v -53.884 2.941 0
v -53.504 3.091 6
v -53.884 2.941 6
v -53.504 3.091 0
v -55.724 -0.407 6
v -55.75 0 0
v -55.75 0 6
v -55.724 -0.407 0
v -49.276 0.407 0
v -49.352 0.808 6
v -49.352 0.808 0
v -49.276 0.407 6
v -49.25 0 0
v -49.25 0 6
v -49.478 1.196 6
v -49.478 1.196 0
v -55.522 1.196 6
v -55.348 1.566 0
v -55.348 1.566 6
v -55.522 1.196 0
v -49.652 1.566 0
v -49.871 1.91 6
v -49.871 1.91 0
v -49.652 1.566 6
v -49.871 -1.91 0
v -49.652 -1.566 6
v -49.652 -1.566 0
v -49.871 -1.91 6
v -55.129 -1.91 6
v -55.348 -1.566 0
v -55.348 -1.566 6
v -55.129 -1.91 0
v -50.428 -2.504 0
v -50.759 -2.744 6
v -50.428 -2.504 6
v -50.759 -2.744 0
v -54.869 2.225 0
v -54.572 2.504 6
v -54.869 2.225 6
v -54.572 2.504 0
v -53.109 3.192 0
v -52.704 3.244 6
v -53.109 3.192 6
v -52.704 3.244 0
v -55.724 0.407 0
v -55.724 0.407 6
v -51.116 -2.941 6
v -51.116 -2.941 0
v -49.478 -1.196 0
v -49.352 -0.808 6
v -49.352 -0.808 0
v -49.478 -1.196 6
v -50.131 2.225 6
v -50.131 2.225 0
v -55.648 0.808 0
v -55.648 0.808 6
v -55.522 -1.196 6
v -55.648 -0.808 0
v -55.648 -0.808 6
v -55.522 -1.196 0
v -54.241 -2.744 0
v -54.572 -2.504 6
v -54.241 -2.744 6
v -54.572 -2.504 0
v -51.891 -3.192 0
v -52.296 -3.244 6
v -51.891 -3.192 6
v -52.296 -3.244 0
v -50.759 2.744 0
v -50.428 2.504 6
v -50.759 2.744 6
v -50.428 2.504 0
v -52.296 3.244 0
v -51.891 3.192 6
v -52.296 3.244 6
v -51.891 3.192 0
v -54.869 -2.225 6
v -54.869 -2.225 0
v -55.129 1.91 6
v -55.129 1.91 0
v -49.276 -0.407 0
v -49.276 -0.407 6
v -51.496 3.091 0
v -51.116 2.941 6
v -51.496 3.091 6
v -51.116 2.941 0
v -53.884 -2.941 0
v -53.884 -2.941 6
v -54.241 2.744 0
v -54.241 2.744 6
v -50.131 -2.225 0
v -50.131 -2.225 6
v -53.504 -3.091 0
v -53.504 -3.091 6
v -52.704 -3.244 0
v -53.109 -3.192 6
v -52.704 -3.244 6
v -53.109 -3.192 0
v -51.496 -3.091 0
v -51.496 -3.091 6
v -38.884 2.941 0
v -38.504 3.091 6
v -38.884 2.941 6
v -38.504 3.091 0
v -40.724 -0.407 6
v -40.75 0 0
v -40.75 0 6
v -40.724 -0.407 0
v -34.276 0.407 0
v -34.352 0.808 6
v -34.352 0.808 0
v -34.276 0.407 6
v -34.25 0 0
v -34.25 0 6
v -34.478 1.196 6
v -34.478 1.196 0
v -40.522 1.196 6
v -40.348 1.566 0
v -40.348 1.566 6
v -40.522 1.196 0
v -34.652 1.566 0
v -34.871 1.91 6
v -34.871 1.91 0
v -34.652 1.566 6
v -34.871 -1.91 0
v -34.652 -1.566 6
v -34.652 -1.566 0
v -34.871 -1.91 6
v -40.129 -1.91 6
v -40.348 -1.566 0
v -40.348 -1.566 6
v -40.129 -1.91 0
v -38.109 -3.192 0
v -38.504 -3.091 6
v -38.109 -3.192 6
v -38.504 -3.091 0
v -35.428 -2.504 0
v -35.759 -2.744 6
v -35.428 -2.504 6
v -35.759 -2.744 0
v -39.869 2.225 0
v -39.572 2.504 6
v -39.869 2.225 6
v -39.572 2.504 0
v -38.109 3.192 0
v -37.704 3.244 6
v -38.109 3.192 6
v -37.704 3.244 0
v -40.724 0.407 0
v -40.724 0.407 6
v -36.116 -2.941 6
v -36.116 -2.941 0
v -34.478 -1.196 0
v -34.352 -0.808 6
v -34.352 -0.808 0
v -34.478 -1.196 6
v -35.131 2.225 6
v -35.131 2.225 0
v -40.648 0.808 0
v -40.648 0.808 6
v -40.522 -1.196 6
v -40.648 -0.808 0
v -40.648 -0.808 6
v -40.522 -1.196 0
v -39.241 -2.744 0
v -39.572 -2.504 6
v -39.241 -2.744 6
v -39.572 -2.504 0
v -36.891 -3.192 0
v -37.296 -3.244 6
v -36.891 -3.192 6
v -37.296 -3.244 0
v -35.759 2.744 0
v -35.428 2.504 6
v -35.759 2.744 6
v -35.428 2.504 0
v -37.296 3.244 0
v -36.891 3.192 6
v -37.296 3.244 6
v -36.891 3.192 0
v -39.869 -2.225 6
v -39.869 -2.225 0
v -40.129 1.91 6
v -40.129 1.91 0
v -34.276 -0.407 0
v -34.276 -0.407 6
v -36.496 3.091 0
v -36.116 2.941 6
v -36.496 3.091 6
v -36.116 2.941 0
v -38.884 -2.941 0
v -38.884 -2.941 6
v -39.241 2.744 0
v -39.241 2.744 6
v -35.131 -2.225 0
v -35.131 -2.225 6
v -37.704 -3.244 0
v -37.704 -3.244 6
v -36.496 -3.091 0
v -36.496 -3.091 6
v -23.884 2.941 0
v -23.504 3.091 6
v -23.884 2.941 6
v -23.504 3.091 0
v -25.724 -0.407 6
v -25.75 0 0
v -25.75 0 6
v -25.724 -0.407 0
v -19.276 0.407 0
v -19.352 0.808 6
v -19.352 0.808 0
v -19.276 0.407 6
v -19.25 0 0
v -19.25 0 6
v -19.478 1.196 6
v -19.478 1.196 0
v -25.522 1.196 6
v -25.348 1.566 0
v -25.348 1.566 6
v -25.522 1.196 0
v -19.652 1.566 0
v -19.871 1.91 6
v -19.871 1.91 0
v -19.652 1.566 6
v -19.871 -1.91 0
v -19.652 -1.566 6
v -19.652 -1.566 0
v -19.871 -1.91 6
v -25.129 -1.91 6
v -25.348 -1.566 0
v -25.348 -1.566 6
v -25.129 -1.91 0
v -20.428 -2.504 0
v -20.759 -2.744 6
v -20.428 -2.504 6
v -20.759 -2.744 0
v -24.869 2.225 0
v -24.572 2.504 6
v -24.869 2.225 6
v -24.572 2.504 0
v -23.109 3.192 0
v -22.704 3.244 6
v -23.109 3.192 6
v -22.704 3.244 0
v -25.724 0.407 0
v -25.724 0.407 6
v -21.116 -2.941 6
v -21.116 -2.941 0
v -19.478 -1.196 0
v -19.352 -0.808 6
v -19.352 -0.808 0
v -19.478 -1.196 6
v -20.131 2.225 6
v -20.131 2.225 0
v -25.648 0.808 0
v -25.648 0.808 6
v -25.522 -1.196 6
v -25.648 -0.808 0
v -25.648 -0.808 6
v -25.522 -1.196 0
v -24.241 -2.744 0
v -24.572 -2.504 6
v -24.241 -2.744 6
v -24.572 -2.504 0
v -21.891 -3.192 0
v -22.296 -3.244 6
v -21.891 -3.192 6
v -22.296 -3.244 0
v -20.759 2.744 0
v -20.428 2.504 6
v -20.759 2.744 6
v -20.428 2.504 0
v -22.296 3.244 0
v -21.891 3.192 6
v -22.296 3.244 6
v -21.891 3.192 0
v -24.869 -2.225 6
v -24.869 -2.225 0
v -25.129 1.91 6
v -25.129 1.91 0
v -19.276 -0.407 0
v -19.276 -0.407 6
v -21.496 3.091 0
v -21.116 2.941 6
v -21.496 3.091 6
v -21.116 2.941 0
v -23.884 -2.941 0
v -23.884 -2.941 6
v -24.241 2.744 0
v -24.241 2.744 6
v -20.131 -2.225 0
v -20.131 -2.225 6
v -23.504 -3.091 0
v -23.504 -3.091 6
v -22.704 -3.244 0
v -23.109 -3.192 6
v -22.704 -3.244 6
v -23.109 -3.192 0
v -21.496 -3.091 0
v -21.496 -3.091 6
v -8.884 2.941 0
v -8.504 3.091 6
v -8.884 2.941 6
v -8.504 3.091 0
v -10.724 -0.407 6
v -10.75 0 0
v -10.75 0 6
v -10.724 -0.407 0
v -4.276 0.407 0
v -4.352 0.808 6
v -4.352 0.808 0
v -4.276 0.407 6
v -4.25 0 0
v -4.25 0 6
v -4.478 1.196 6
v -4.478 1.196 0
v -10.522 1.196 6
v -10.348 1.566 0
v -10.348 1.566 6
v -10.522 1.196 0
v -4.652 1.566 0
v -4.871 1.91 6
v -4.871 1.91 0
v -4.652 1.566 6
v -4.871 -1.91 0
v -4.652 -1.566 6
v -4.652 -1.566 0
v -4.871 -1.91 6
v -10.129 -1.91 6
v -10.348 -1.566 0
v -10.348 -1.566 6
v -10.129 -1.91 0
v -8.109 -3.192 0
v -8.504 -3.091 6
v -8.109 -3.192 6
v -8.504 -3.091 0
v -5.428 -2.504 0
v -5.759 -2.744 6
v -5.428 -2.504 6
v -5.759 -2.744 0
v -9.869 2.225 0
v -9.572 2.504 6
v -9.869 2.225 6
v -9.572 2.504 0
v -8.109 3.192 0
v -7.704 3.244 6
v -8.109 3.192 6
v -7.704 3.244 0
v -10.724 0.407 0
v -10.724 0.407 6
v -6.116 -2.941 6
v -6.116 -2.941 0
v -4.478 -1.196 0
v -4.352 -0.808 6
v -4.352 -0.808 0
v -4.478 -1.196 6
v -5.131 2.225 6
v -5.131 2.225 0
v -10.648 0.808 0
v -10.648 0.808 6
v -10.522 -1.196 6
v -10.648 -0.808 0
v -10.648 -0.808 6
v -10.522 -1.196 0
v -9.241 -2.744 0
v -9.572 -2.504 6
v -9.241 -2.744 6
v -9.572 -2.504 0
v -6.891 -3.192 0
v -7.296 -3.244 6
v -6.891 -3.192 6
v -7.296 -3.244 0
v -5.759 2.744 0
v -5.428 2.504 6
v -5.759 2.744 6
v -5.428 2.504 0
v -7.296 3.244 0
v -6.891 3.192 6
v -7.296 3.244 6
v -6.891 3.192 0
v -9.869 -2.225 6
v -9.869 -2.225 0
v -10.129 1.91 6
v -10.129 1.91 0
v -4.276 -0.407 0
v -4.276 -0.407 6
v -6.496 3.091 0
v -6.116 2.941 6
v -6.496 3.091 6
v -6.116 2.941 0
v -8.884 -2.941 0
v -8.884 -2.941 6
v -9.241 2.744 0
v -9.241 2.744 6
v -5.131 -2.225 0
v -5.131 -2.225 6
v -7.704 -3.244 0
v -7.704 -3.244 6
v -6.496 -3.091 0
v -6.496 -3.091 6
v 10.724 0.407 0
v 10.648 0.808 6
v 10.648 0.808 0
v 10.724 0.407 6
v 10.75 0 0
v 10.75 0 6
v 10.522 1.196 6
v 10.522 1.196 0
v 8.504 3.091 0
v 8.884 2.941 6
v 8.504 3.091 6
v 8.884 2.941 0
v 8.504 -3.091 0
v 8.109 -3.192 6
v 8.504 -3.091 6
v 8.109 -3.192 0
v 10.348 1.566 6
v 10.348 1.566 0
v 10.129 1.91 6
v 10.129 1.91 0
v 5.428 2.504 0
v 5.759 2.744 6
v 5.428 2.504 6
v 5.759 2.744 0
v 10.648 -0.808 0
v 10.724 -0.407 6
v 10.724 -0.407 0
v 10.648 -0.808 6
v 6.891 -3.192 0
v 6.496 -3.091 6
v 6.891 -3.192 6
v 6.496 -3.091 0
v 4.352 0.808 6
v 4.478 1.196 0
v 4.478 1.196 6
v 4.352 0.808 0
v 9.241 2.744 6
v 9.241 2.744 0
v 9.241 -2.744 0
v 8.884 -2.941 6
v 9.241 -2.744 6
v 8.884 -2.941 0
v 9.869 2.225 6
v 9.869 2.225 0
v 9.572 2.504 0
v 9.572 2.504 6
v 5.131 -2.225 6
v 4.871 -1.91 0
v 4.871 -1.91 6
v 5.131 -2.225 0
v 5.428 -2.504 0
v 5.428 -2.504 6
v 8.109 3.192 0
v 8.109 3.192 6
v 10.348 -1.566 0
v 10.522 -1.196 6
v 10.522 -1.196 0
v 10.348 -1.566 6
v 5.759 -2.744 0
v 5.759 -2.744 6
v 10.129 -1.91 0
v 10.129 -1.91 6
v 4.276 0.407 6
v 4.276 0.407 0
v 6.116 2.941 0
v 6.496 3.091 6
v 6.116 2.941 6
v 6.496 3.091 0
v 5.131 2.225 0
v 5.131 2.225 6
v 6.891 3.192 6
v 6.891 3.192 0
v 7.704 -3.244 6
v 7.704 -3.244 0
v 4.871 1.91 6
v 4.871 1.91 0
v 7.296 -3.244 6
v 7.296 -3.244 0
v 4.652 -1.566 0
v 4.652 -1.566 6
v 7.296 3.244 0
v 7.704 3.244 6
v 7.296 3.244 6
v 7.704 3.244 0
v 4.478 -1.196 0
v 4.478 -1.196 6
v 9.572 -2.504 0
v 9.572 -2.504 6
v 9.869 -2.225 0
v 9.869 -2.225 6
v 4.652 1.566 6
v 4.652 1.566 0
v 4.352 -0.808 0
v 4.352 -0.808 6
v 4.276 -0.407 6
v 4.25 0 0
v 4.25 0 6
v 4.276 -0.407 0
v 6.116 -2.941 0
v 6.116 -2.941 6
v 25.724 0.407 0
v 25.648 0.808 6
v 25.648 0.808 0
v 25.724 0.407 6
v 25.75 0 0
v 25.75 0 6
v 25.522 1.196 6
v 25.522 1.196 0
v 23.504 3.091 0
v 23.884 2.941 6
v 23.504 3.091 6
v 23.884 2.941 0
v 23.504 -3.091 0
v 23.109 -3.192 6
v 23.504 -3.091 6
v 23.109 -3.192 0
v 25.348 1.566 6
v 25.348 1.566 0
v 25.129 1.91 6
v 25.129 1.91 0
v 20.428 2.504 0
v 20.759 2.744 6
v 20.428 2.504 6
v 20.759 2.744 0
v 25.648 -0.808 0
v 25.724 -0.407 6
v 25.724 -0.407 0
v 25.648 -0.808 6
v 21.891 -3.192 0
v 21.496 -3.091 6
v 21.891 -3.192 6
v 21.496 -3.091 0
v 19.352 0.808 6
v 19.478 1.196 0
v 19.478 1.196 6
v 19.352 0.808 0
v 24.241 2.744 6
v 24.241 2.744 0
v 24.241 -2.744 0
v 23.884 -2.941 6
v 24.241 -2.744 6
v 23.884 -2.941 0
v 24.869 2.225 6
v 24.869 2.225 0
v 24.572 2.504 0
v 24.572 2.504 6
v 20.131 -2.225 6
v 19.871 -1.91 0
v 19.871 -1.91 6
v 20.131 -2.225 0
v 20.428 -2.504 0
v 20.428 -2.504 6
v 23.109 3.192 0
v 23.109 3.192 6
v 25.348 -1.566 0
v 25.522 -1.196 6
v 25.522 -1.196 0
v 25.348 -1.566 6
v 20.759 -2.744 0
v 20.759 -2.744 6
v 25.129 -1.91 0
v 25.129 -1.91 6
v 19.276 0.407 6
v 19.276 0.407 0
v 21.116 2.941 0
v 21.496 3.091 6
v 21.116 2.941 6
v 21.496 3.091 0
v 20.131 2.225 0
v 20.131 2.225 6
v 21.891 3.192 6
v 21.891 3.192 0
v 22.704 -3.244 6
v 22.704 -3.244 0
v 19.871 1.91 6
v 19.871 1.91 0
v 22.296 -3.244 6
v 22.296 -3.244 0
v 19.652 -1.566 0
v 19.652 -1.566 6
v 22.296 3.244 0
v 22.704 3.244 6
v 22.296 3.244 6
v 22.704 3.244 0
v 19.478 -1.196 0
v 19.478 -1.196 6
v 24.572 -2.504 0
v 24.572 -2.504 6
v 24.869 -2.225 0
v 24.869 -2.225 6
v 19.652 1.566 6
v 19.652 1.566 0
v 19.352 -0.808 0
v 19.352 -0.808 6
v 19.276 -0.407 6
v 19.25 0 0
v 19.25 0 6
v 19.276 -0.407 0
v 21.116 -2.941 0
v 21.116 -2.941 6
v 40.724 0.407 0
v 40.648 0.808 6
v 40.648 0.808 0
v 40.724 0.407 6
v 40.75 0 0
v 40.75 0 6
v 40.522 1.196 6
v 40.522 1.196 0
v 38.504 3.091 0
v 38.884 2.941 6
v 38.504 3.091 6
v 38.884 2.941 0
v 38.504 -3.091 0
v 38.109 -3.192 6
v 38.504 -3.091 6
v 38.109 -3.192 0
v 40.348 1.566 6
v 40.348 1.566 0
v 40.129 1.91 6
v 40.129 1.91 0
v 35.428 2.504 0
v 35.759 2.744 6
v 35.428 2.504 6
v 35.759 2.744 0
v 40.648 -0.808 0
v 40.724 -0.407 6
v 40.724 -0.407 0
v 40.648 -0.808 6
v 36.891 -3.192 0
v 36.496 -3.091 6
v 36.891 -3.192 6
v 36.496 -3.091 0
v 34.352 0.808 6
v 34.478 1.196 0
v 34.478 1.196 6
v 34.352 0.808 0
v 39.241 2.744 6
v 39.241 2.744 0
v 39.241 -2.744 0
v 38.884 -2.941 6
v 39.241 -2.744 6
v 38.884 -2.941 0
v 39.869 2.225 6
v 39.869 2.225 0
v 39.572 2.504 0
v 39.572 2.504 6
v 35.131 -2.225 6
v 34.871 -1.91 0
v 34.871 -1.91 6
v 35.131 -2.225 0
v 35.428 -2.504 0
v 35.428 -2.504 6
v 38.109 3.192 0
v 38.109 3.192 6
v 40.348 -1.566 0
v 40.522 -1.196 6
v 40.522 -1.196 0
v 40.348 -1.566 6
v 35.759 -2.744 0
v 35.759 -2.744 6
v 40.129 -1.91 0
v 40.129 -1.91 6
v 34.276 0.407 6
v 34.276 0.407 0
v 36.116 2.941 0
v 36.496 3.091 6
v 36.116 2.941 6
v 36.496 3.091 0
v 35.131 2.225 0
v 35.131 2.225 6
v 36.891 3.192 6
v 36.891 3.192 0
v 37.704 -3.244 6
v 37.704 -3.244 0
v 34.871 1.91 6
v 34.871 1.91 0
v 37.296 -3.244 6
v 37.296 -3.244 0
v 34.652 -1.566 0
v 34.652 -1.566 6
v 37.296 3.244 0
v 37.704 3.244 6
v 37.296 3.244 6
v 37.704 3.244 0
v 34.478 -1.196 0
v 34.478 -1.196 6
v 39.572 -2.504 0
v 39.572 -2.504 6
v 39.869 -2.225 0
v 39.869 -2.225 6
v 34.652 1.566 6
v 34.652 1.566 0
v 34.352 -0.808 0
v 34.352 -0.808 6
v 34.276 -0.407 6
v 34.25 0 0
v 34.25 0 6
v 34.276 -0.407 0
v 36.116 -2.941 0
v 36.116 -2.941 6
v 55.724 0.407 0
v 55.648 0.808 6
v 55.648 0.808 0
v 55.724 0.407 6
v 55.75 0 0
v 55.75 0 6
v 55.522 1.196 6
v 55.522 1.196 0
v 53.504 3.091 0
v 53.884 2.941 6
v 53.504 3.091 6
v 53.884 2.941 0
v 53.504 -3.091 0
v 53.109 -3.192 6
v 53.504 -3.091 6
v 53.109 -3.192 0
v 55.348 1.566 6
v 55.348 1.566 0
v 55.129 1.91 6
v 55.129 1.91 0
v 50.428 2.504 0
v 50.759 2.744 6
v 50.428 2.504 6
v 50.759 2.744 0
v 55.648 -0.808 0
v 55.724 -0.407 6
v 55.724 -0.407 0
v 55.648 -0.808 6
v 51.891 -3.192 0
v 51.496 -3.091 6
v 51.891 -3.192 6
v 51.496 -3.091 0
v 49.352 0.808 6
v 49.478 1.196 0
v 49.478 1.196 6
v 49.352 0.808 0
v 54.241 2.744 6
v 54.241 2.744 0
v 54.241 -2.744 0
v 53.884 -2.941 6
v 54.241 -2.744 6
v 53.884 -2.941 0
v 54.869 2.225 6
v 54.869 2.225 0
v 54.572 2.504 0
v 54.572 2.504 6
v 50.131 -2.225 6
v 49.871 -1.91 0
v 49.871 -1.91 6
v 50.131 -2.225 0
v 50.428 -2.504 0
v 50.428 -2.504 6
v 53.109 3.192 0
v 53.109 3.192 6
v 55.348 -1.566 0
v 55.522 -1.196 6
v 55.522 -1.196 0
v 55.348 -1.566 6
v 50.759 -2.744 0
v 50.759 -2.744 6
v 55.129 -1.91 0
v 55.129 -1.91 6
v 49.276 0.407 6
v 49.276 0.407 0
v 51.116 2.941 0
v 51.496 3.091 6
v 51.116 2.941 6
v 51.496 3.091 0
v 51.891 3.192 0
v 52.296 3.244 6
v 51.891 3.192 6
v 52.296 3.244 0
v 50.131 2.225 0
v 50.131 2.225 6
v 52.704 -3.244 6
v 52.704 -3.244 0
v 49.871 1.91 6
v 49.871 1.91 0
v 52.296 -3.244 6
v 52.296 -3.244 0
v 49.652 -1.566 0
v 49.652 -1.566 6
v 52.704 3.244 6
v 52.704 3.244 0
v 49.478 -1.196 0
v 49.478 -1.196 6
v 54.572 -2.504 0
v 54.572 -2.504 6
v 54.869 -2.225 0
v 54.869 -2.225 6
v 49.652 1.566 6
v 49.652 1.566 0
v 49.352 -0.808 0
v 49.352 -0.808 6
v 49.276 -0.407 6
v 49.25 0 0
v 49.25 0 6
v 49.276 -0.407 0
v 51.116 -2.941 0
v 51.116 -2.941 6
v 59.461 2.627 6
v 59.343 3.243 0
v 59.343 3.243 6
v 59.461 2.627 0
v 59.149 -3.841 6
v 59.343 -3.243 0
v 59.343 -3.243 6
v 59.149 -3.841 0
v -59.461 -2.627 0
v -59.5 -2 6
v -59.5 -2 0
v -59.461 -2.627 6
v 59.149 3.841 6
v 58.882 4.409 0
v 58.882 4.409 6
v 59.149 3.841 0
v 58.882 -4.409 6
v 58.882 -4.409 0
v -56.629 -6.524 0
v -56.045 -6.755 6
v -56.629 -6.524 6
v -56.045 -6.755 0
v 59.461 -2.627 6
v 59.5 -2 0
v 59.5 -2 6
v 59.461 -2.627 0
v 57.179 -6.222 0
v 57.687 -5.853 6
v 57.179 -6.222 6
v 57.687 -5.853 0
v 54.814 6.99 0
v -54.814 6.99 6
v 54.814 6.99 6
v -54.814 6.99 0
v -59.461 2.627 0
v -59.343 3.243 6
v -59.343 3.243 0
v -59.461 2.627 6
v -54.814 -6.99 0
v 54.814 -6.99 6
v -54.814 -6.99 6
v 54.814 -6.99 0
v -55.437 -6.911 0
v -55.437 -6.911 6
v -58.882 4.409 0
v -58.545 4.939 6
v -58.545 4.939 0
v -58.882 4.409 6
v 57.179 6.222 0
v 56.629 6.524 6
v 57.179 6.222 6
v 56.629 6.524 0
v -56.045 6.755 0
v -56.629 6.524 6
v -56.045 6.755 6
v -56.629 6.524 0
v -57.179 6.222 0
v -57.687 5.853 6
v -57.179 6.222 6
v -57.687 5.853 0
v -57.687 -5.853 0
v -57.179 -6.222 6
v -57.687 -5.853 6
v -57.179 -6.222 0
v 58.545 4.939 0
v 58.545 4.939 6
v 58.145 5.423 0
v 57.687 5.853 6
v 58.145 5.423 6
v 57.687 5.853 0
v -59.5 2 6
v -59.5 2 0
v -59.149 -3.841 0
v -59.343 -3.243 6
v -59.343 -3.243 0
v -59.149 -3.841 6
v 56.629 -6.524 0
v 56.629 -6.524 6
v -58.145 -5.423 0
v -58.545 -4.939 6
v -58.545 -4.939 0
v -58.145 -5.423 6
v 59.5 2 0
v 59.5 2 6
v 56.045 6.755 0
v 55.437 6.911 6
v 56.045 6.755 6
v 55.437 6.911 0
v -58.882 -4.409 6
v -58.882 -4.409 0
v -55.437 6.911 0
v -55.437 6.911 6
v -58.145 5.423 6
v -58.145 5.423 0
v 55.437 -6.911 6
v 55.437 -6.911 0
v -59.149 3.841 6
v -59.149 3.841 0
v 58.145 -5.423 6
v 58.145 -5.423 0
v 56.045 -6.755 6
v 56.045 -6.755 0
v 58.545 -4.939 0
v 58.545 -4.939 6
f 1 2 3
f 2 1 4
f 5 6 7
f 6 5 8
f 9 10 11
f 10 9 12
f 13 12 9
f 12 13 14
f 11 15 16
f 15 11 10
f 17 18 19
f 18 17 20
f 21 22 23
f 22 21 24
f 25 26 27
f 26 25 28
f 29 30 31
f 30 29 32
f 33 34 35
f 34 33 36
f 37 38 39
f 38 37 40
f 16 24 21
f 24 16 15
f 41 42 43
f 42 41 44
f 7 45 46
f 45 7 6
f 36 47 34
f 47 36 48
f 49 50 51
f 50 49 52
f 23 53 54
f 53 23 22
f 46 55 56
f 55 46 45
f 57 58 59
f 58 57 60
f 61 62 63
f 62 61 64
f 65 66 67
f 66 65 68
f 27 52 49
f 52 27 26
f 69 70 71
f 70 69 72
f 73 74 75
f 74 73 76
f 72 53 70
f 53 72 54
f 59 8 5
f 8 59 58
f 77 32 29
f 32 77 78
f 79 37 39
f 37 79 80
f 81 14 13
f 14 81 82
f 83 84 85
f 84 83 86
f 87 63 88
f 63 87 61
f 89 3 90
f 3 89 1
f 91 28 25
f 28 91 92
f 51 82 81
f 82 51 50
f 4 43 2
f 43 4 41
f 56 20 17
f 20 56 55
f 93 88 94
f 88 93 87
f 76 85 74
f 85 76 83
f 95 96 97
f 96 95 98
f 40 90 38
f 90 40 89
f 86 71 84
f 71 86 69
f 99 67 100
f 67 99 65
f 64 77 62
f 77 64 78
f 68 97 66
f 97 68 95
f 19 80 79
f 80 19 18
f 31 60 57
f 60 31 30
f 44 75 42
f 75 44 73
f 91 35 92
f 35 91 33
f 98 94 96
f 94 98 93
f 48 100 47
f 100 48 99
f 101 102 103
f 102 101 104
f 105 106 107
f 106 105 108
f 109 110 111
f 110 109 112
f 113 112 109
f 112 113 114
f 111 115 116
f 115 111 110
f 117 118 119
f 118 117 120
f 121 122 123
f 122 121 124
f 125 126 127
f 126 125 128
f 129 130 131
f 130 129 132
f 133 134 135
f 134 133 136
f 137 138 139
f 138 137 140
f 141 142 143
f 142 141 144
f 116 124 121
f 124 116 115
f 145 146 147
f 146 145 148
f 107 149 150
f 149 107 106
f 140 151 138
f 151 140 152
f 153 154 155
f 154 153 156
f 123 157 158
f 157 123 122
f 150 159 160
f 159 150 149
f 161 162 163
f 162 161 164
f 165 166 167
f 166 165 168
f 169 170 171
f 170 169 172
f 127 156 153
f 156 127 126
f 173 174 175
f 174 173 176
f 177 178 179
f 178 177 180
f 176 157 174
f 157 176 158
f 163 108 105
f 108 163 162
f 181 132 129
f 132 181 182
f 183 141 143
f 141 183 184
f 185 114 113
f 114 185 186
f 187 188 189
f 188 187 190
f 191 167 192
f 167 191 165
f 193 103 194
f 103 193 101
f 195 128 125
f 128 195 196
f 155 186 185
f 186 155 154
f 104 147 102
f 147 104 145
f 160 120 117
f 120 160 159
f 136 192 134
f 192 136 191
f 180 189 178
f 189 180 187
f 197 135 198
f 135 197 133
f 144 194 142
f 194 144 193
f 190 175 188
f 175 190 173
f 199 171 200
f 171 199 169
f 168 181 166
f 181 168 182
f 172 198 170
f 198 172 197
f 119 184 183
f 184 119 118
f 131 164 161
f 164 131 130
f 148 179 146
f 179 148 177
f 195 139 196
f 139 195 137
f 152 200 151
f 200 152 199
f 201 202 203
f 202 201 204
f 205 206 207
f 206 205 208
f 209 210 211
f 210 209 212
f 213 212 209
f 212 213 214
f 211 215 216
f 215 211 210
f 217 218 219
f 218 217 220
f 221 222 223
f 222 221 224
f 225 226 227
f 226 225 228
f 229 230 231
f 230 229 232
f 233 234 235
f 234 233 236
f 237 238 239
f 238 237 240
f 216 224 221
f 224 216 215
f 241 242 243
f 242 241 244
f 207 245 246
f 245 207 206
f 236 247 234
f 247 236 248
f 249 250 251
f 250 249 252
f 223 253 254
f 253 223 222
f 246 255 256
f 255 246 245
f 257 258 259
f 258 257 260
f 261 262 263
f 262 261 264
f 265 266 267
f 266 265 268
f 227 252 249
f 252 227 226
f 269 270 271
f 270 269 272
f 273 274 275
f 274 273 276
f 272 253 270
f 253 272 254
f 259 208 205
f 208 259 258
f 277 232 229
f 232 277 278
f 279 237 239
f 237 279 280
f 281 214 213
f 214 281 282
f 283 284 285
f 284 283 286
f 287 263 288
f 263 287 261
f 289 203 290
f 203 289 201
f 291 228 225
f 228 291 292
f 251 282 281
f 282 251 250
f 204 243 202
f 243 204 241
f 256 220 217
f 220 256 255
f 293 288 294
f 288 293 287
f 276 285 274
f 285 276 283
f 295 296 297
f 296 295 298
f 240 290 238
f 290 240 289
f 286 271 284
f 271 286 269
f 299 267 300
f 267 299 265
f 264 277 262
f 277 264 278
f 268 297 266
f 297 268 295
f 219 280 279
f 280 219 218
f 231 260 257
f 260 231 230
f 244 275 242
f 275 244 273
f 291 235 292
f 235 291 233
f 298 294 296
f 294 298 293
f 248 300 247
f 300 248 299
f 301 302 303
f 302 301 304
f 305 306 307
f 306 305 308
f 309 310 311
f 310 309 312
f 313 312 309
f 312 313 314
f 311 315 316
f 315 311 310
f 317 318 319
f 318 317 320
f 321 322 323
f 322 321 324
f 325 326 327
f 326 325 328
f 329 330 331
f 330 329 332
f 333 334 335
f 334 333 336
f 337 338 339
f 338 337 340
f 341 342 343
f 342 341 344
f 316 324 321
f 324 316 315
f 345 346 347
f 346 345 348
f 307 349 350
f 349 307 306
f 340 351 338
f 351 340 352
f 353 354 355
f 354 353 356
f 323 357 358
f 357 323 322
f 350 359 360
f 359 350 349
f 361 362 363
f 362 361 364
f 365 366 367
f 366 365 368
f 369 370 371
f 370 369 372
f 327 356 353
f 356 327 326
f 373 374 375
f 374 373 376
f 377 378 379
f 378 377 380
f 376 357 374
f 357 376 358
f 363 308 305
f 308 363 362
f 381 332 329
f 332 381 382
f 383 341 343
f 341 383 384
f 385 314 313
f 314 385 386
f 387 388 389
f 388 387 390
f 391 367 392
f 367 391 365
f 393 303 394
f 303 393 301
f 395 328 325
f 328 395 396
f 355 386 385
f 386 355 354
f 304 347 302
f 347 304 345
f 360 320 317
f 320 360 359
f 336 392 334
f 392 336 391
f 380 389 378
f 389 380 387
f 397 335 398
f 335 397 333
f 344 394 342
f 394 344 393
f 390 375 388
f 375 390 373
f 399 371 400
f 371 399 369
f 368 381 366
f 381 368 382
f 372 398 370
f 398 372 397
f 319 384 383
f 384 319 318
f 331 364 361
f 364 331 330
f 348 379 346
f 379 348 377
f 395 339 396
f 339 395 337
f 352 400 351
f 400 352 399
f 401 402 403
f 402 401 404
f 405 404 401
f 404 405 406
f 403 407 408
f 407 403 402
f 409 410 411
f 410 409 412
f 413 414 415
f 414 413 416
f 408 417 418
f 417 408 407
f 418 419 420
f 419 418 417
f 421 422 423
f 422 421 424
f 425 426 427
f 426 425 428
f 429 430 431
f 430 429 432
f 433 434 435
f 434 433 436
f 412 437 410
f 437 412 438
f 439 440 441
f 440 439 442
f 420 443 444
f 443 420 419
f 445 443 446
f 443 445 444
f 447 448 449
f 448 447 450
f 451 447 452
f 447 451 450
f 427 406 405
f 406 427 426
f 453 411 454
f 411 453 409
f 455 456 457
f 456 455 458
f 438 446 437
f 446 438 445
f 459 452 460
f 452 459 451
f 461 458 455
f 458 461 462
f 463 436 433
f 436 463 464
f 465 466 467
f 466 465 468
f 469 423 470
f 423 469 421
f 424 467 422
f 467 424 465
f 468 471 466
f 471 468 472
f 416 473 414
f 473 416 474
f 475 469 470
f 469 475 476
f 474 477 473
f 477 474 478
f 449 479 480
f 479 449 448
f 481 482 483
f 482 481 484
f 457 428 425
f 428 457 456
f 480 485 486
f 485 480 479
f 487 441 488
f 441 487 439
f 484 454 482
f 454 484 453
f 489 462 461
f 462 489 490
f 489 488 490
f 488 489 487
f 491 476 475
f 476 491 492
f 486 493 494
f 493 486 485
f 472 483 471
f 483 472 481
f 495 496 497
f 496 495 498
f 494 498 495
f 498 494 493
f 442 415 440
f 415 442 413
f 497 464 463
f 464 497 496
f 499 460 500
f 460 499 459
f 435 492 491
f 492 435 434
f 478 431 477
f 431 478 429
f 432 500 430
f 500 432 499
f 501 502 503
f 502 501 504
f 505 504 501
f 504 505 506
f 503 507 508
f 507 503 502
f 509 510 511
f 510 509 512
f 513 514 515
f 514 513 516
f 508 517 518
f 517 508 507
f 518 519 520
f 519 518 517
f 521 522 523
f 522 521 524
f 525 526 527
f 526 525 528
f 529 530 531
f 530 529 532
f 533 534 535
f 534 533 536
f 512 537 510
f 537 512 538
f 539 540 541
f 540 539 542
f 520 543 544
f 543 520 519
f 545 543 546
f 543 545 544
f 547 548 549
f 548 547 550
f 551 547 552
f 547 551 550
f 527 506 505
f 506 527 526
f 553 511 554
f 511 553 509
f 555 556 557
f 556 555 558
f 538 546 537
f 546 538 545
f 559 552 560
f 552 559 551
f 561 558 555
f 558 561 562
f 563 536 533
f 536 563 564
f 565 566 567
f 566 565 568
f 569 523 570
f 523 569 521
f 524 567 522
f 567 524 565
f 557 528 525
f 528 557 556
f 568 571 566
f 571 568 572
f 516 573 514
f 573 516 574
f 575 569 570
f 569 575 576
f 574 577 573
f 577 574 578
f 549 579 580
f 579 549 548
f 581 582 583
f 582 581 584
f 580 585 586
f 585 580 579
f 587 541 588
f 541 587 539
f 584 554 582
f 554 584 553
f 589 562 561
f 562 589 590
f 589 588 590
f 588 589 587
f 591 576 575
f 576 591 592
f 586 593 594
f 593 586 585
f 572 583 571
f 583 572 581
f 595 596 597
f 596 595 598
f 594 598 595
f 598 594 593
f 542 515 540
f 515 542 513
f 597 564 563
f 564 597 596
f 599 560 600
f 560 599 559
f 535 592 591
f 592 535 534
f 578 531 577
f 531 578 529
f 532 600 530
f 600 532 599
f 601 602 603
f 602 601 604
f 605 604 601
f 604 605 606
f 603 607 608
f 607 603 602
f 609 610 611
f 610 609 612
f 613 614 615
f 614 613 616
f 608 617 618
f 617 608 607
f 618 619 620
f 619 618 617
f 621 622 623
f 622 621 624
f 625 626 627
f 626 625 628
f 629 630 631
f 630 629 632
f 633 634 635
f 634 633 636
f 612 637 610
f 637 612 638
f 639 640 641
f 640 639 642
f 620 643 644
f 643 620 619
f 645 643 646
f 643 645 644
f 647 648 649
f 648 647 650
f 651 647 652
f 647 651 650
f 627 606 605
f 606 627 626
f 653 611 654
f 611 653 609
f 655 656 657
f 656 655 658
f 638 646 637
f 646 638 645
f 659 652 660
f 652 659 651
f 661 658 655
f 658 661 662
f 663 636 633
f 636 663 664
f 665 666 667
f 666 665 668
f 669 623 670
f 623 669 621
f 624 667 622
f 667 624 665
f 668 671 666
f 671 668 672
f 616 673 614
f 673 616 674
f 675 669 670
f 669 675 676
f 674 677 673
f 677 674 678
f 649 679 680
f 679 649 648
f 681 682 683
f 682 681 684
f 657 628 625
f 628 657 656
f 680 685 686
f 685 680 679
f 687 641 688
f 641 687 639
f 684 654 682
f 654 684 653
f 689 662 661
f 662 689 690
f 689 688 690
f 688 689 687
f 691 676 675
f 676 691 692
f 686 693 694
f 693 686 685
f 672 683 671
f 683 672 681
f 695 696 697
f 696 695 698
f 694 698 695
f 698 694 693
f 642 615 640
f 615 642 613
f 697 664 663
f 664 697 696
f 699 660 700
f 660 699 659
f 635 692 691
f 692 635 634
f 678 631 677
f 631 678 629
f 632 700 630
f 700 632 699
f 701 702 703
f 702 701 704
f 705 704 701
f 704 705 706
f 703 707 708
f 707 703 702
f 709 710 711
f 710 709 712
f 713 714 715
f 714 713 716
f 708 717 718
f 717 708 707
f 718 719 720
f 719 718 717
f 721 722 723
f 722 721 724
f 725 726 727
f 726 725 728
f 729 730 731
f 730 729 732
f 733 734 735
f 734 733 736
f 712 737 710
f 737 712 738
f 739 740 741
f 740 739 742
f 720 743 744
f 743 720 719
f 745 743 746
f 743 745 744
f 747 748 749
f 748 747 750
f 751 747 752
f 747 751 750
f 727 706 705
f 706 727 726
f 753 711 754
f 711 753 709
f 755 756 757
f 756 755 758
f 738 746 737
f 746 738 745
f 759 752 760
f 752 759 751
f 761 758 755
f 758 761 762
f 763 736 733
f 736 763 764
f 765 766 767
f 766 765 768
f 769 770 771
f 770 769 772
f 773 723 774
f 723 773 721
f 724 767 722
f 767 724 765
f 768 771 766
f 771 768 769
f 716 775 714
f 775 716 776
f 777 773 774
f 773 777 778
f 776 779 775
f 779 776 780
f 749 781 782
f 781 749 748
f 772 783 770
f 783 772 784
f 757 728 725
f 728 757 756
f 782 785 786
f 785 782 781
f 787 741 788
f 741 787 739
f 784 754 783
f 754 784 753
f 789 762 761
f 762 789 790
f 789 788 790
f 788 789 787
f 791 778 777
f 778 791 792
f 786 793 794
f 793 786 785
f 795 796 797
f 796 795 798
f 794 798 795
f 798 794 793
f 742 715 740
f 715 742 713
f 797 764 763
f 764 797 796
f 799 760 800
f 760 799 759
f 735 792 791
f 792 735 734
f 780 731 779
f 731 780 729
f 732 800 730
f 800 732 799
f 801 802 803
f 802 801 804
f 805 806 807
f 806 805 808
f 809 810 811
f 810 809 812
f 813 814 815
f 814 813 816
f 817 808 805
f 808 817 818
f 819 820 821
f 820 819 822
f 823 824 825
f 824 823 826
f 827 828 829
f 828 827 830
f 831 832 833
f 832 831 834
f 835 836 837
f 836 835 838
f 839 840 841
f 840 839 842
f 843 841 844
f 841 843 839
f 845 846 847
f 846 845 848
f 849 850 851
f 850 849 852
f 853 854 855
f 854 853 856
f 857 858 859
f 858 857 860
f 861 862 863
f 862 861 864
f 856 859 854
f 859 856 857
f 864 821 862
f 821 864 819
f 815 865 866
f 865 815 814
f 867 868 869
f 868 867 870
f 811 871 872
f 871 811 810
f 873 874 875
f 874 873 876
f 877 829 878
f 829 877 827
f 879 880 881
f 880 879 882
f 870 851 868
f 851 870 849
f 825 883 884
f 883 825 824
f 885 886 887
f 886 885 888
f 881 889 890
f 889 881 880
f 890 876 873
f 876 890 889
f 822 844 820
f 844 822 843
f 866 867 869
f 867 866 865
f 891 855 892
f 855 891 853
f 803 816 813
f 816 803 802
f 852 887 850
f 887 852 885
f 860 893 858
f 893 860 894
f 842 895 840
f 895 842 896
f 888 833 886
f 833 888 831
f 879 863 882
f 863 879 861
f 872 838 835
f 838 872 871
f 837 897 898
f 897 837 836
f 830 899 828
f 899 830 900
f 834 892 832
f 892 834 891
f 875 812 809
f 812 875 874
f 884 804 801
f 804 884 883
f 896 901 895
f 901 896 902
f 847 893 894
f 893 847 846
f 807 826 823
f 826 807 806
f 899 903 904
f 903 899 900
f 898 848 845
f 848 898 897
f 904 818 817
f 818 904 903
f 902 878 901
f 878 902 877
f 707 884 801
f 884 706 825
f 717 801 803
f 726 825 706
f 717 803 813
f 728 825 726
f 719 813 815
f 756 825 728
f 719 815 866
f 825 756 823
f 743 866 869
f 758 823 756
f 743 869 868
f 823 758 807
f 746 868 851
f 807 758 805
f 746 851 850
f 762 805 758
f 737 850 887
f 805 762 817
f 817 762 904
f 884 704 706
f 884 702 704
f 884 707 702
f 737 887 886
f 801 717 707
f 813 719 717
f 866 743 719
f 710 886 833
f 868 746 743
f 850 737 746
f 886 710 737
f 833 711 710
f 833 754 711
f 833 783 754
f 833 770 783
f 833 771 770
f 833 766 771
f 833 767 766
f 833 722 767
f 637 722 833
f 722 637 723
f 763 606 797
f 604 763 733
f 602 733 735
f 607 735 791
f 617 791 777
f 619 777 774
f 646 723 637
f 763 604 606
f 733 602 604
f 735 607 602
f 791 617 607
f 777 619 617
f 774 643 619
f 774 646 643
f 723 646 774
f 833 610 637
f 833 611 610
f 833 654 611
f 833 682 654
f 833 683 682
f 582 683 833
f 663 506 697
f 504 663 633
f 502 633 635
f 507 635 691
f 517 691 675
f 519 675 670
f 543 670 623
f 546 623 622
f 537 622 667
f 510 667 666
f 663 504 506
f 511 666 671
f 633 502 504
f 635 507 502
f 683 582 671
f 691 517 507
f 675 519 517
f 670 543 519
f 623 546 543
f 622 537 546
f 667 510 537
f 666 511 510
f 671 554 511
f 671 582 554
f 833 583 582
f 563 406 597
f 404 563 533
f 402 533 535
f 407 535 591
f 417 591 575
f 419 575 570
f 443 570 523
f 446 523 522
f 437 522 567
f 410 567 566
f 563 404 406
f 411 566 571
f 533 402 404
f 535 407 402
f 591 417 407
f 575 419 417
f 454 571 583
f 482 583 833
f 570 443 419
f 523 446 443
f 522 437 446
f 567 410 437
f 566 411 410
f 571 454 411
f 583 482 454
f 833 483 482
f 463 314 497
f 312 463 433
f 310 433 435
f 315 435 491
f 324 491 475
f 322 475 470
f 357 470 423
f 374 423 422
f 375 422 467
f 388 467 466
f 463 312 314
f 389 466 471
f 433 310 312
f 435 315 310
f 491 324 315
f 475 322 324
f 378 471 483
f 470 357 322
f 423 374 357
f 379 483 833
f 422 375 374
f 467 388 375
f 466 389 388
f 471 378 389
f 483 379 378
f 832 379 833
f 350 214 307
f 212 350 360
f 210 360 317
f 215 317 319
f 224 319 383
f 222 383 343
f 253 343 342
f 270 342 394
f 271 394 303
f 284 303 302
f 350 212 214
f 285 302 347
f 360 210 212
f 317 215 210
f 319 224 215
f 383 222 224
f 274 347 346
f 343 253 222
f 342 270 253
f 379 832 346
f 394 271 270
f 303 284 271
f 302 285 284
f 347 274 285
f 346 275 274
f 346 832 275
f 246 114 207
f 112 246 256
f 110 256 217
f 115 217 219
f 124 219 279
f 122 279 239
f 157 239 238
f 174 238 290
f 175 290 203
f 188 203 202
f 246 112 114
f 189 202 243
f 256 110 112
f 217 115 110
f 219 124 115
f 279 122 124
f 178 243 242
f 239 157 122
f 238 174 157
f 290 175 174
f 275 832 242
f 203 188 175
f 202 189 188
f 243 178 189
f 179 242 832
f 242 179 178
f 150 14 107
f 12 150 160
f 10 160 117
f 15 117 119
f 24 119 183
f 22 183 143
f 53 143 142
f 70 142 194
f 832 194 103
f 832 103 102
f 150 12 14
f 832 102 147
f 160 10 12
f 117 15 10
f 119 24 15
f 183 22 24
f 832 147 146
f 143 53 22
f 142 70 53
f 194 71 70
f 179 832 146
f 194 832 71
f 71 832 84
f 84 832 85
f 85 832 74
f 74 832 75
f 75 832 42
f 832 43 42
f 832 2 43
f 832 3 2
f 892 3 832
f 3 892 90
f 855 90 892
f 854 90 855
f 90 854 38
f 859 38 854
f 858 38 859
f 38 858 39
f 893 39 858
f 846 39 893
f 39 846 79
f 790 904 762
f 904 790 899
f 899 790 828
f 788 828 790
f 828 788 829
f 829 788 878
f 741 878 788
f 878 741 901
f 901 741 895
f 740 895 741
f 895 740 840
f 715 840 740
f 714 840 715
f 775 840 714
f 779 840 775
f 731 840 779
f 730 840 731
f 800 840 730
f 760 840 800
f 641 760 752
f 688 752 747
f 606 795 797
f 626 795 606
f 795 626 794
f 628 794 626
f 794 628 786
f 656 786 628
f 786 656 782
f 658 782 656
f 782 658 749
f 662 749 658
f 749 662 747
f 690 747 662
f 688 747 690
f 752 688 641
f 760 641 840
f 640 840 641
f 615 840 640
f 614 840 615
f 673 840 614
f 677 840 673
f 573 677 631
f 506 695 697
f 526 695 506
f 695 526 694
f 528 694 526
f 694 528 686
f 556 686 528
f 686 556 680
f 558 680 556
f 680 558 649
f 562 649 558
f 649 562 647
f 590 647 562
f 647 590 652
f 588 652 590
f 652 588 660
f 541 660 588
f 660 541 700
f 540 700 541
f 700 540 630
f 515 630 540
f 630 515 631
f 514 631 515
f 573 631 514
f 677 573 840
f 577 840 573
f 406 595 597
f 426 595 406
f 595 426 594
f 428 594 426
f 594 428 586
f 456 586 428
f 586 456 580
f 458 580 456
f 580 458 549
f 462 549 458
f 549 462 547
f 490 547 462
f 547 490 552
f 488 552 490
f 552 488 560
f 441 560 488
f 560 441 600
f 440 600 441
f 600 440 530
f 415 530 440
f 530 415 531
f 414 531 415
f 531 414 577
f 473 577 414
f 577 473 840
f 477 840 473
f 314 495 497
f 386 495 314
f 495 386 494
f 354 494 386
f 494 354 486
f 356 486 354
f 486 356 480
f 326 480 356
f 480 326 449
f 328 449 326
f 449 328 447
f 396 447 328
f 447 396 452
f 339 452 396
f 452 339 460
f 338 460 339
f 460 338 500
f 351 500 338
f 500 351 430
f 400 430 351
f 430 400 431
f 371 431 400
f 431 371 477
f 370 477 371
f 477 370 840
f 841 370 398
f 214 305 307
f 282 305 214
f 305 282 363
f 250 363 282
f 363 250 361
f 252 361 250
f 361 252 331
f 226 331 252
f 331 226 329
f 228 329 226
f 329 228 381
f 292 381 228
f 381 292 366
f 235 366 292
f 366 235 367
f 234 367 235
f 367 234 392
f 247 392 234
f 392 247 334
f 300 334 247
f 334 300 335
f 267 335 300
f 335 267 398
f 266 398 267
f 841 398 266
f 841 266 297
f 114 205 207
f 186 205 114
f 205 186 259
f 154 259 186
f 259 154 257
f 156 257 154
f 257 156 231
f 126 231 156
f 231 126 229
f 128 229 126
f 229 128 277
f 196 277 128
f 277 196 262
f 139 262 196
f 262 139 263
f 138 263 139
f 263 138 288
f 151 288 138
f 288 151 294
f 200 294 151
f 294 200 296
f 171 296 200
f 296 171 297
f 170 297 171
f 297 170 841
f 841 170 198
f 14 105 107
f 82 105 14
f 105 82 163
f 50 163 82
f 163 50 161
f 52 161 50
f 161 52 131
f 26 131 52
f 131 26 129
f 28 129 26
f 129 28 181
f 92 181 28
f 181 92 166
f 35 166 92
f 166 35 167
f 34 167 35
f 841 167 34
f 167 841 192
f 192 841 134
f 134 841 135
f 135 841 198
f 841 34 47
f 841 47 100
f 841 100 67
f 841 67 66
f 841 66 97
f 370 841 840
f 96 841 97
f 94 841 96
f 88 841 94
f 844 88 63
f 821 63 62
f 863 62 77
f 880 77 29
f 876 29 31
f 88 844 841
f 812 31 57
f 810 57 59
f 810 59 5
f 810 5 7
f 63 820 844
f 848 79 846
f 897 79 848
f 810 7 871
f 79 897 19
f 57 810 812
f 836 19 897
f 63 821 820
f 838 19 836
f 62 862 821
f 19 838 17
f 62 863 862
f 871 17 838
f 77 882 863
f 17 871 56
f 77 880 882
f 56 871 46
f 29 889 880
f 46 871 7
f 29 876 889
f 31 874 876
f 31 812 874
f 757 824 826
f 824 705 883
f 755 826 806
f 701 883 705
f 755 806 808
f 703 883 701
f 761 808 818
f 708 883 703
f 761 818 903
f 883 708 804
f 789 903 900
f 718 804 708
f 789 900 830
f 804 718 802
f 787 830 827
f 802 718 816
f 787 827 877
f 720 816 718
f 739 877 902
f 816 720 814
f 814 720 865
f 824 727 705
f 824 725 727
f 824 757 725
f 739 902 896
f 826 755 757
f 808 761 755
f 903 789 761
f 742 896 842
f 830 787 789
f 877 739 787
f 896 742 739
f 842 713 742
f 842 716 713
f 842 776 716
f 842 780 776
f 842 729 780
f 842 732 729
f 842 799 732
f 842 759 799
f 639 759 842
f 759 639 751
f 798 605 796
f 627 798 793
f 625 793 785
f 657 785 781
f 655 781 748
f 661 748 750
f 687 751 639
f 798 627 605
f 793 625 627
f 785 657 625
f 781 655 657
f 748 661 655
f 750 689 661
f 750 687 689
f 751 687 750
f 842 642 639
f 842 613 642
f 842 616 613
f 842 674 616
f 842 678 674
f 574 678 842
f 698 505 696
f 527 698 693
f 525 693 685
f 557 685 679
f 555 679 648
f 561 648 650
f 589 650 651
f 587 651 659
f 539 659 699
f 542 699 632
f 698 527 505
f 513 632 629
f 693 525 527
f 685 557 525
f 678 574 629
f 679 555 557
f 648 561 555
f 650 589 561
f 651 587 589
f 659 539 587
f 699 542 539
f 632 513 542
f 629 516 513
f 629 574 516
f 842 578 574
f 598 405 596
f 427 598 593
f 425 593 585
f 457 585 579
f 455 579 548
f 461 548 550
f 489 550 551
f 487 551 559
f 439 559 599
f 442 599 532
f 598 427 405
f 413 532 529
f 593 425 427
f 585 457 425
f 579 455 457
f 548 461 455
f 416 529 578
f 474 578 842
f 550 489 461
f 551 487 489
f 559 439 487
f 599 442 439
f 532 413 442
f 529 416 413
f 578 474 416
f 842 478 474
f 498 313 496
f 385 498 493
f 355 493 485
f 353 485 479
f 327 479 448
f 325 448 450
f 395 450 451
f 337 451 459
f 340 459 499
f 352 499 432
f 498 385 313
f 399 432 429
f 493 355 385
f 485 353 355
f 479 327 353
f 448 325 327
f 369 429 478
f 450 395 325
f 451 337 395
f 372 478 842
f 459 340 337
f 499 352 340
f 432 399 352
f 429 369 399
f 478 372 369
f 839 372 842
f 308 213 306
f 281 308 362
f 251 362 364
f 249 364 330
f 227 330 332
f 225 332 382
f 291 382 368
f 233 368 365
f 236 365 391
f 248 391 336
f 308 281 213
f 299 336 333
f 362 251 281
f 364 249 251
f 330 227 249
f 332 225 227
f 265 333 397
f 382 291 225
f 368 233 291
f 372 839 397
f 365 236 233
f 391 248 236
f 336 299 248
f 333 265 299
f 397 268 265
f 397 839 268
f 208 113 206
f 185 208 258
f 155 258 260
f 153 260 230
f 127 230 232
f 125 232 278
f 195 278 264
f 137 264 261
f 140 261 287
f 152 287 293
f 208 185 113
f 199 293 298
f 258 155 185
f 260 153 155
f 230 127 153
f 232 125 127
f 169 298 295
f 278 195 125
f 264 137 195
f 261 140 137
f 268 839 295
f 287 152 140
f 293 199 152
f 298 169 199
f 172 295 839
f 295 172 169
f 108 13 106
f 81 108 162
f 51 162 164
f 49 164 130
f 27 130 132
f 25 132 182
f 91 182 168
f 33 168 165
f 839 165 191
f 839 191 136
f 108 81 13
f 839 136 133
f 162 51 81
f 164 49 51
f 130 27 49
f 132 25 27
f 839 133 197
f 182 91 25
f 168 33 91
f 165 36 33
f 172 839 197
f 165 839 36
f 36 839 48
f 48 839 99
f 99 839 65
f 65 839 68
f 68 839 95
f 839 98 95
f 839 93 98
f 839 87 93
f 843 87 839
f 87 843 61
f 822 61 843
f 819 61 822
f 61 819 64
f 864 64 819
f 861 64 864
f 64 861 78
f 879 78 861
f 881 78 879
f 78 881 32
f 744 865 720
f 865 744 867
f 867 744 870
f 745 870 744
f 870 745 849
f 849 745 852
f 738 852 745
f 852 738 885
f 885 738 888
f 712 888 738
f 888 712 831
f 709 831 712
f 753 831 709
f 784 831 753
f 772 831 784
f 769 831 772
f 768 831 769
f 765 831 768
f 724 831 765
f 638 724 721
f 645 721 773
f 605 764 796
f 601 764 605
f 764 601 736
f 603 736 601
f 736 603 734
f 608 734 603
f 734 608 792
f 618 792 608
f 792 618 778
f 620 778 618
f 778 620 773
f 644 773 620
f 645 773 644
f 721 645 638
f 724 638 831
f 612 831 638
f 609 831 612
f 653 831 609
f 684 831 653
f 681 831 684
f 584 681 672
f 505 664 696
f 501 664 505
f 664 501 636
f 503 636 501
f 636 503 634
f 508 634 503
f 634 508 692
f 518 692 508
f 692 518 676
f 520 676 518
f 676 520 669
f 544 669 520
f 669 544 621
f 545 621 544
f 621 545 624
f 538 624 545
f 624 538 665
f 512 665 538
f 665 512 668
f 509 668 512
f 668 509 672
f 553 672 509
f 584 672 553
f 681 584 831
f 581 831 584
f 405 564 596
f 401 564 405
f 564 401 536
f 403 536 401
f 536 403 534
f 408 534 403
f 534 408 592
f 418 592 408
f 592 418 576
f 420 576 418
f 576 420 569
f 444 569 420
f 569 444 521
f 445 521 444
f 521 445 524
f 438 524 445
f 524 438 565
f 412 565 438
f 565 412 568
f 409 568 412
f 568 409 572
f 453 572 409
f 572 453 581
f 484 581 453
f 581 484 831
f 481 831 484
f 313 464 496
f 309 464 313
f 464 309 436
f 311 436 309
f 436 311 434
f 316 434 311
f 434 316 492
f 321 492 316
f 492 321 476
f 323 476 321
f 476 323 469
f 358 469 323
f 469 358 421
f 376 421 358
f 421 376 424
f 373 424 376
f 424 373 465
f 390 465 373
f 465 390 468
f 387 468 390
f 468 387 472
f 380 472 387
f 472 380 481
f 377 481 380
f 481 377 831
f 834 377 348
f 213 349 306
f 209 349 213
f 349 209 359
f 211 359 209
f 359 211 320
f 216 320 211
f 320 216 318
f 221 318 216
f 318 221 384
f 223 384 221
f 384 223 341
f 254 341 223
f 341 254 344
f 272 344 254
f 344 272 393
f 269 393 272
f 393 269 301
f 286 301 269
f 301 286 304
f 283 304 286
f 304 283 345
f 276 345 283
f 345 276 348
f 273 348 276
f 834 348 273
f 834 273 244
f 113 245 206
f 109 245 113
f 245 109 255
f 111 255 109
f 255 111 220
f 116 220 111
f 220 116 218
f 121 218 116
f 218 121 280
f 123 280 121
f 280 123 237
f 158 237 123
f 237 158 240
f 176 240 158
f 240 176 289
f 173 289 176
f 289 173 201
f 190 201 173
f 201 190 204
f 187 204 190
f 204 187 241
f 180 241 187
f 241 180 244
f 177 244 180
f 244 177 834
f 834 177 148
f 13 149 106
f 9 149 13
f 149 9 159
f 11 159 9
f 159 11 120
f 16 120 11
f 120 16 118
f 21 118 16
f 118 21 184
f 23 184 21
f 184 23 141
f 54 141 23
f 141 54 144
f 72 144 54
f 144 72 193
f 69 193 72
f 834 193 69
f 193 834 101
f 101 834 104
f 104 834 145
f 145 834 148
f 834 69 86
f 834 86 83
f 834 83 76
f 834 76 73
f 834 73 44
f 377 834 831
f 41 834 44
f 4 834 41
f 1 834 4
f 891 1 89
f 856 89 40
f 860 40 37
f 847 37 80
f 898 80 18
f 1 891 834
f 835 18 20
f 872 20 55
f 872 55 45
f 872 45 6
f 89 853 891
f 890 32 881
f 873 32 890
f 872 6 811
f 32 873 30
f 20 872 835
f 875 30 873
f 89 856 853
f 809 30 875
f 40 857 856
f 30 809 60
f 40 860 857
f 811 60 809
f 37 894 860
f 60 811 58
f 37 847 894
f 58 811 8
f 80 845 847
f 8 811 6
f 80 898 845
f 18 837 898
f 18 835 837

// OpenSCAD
$fn = 50;


difference() {
	union() {
		hull() {
			translate(v = [-54.5000000000, 2.0000000000, 0]) {
				cylinder(h = 6, r = 5);
			}
			translate(v = [54.5000000000, 2.0000000000, 0]) {
				cylinder(h = 6, r = 5);
			}
			translate(v = [-54.5000000000, -2.0000000000, 0]) {
				cylinder(h = 6, r = 5);
			}
			translate(v = [54.5000000000, -2.0000000000, 0]) {
				cylinder(h = 6, r = 5);
			}
		}
	}
	union() {
		translate(v = [-52.5000000000, 0.0000000000, 0]) {
			translate(v = [0, 0, -100]) {
				cylinder(h = 200, r = 3.2500000000);
			}
		}
		translate(v = [-37.5000000000, 0.0000000000, 0]) {
			translate(v = [0, 0, -100]) {
				cylinder(h = 200, r = 3.2500000000);
			}
		}
		translate(v = [-22.5000000000, 0.0000000000, 0]) {
			translate(v = [0, 0, -100]) {
				cylinder(h = 200, r = 3.2500000000);
			}
		}
		translate(v = [-7.5000000000, 0.0000000000, 0]) {
			translate(v = [0, 0, -100]) {
				cylinder(h = 200, r = 3.2500000000);
			}
		}
		translate(v = [7.5000000000, 0.0000000000, 0]) {
			translate(v = [0, 0, -100]) {
				cylinder(h = 200, r = 3.2500000000);
			}
		}
		translate(v = [22.5000000000, 0.0000000000, 0]) {
			translate(v = [0, 0, -100]) {
				cylinder(h = 200, r = 3.2500000000);
			}
		}
		translate(v = [37.5000000000, 0.0000000000, 0]) {
			translate(v = [0, 0, -100]) {
				cylinder(h = 200, r = 3.2500000000);
			}
		}
		translate(v = [52.5000000000, 0.0000000000, 0]) {
			translate(v = [0, 0, -100]) {
				cylinder(h = 200, r = 3.2500000000);
			}
		}
	}
}
